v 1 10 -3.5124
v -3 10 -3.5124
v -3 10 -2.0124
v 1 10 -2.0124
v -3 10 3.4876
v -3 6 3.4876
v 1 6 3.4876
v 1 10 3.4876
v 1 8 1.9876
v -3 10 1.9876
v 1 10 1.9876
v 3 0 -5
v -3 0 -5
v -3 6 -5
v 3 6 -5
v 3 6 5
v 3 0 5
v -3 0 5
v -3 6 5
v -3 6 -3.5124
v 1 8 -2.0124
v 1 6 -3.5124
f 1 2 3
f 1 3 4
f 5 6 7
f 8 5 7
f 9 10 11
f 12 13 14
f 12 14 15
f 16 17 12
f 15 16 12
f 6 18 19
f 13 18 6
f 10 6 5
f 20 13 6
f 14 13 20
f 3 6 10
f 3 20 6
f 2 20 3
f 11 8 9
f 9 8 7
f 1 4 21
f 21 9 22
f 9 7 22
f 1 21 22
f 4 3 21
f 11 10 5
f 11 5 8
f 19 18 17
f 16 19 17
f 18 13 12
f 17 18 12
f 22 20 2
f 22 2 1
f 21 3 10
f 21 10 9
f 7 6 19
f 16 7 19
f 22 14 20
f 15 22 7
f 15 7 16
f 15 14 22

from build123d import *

# Parameters (mm, degrees)
CROQUIS1_W              = 6
CROQUIS1_H              = 10
SALIENTE_EXTRUIR1_DEPTH = 6
CROQUIS2_W              = 4
CROQUIS2_H              = 7
SALIENTE_EXTRUIR3_DEPTH = 4
CROQUIS4_W              = 4
CROQUIS4_H              = 4
CORTAR_EXTRUIR1_DEPTH   = 2
SALIENTE_EXTRUIR5_DEPTH = 4


with BuildPart() as part:
    # Croquis1 → Saliente-Extruir1 (new body)
    with BuildSketch(Plane(origin=(0, 0, 0), x_dir=(1, 0, 0), z_dir=(0, 1, 0))):
        Rectangle(CROQUIS1_W, CROQUIS1_H)
    extrude(amount=SALIENTE_EXTRUIR1_DEPTH)

    # Croquis2 → Saliente-Extruir3 (add)
    with BuildSketch(Plane(origin=(0, 6, 0), x_dir=(1, 0, 0), z_dir=(0, 1, 0))):
        with Locations((-1, 0.012360782)):
            Rectangle(CROQUIS2_W, CROQUIS2_H)
    extrude(amount=SALIENTE_EXTRUIR3_DEPTH)

    # Croquis4 → Cortar-Extruir1 (cut)
    with BuildSketch(Plane(origin=(0, 10, 0), x_dir=(1, 0, 0), z_dir=(0, 1, 0))):
        with Locations((-1, 0.012360782)):
            Rectangle(CROQUIS4_W, CROQUIS4_H)
    extrude(amount=-CORTAR_EXTRUIR1_DEPTH, mode=Mode.SUBTRACT)

    # Croquis6 → Saliente-Extruir5 (add)
    with BuildSketch(Plane.XY.offset(-2.012360782)):
        Polygon((-3, 10), (1, 8), (-3, 8), align=None)
    extrude(amount=SALIENTE_EXTRUIR5_DEPTH)


solid = part.part
